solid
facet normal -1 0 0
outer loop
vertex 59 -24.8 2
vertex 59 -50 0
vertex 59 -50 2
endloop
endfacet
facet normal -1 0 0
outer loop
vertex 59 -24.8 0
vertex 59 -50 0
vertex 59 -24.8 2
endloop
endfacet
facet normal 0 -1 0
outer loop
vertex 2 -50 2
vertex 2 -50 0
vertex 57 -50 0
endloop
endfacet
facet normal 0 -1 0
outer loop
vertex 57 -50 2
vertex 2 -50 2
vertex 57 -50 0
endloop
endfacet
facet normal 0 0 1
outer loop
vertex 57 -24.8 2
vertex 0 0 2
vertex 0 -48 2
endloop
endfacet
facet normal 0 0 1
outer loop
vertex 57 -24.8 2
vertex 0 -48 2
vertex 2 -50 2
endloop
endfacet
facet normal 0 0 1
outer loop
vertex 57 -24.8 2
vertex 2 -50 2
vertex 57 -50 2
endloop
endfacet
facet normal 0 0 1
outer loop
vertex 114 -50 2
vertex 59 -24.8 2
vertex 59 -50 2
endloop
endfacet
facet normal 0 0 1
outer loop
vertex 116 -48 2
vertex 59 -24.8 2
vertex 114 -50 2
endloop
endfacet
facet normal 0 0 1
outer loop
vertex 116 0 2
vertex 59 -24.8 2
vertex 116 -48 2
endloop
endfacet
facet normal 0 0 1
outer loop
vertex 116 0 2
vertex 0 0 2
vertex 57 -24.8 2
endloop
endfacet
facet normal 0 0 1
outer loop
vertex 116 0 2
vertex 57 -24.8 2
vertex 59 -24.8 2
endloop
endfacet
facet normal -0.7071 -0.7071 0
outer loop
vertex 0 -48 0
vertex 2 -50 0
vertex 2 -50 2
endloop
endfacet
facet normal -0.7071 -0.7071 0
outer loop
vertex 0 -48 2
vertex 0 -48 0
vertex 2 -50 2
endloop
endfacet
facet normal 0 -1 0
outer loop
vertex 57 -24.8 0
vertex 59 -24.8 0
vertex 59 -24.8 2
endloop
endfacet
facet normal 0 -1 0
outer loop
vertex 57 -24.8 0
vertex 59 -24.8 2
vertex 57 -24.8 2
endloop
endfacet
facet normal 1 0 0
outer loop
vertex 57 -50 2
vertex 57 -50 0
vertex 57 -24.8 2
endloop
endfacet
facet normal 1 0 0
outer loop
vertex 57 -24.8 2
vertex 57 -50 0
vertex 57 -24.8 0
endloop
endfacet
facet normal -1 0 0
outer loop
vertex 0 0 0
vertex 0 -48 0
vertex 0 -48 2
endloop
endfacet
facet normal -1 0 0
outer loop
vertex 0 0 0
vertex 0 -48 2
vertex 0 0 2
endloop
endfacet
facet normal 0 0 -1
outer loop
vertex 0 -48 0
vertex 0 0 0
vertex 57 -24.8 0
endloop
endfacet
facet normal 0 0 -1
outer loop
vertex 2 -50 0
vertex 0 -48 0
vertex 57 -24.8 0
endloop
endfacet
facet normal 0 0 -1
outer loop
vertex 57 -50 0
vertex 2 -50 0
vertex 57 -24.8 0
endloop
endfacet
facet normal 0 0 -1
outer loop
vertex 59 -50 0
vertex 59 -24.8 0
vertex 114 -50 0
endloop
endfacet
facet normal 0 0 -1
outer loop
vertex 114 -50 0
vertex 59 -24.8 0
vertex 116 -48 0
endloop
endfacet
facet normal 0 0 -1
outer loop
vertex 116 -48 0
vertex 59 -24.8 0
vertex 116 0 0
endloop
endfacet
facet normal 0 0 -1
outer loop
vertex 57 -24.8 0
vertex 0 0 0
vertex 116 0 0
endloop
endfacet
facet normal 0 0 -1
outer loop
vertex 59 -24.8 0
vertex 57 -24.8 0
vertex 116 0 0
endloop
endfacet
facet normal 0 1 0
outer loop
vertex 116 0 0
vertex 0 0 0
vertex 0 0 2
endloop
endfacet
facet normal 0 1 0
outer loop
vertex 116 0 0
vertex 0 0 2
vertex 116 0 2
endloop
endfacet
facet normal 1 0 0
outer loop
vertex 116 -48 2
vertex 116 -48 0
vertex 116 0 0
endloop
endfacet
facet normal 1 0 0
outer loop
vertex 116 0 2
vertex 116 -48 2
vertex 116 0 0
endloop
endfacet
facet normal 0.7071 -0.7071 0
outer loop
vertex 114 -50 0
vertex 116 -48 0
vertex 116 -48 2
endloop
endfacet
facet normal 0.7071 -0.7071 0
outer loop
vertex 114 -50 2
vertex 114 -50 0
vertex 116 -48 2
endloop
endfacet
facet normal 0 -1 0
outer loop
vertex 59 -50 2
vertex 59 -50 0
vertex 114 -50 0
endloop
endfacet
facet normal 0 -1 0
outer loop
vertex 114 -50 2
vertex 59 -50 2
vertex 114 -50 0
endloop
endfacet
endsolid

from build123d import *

# Parameters (mm, degrees)
SKETCH_1_W          = 116
SKETCH_1_H          = 50
EXTRUDE_1_DEPTH     = 2
CHAMFER_1_SIZE      = 2
SKETCH_2_W          = 2
SKETCH_2_H          = 25.2
CUT_EXTRUDE_1_DEPTH = 127.332893579


with BuildPart() as part:
    # 草图1 → 凸台-拉伸1 (new body)
    with BuildSketch(Plane.XY):
        with Locations((58, -25)):
            Rectangle(SKETCH_1_W, SKETCH_1_H)
    extrude(amount=EXTRUDE_1_DEPTH)

    # 倒角1
    chamfer_1_edges = [part.edges().sort_by_distance(p)[0] for p in [
        (116, -50, 1),
        (0, -50, 1),
    ]]
    chamfer(chamfer_1_edges, length=CHAMFER_1_SIZE)

    # 草图2 → 切除-拉伸1 (cut, through all)
    with BuildSketch(Plane(origin=(0, 0, 0), x_dir=(-1, 0, 0), z_dir=(0, 0, -1))):
        with Locations((-58, -37.4)):
            Rectangle(SKETCH_2_W, SKETCH_2_H)
    extrude(amount=-CUT_EXTRUDE_1_DEPTH, mode=Mode.SUBTRACT)


solid = part.part
